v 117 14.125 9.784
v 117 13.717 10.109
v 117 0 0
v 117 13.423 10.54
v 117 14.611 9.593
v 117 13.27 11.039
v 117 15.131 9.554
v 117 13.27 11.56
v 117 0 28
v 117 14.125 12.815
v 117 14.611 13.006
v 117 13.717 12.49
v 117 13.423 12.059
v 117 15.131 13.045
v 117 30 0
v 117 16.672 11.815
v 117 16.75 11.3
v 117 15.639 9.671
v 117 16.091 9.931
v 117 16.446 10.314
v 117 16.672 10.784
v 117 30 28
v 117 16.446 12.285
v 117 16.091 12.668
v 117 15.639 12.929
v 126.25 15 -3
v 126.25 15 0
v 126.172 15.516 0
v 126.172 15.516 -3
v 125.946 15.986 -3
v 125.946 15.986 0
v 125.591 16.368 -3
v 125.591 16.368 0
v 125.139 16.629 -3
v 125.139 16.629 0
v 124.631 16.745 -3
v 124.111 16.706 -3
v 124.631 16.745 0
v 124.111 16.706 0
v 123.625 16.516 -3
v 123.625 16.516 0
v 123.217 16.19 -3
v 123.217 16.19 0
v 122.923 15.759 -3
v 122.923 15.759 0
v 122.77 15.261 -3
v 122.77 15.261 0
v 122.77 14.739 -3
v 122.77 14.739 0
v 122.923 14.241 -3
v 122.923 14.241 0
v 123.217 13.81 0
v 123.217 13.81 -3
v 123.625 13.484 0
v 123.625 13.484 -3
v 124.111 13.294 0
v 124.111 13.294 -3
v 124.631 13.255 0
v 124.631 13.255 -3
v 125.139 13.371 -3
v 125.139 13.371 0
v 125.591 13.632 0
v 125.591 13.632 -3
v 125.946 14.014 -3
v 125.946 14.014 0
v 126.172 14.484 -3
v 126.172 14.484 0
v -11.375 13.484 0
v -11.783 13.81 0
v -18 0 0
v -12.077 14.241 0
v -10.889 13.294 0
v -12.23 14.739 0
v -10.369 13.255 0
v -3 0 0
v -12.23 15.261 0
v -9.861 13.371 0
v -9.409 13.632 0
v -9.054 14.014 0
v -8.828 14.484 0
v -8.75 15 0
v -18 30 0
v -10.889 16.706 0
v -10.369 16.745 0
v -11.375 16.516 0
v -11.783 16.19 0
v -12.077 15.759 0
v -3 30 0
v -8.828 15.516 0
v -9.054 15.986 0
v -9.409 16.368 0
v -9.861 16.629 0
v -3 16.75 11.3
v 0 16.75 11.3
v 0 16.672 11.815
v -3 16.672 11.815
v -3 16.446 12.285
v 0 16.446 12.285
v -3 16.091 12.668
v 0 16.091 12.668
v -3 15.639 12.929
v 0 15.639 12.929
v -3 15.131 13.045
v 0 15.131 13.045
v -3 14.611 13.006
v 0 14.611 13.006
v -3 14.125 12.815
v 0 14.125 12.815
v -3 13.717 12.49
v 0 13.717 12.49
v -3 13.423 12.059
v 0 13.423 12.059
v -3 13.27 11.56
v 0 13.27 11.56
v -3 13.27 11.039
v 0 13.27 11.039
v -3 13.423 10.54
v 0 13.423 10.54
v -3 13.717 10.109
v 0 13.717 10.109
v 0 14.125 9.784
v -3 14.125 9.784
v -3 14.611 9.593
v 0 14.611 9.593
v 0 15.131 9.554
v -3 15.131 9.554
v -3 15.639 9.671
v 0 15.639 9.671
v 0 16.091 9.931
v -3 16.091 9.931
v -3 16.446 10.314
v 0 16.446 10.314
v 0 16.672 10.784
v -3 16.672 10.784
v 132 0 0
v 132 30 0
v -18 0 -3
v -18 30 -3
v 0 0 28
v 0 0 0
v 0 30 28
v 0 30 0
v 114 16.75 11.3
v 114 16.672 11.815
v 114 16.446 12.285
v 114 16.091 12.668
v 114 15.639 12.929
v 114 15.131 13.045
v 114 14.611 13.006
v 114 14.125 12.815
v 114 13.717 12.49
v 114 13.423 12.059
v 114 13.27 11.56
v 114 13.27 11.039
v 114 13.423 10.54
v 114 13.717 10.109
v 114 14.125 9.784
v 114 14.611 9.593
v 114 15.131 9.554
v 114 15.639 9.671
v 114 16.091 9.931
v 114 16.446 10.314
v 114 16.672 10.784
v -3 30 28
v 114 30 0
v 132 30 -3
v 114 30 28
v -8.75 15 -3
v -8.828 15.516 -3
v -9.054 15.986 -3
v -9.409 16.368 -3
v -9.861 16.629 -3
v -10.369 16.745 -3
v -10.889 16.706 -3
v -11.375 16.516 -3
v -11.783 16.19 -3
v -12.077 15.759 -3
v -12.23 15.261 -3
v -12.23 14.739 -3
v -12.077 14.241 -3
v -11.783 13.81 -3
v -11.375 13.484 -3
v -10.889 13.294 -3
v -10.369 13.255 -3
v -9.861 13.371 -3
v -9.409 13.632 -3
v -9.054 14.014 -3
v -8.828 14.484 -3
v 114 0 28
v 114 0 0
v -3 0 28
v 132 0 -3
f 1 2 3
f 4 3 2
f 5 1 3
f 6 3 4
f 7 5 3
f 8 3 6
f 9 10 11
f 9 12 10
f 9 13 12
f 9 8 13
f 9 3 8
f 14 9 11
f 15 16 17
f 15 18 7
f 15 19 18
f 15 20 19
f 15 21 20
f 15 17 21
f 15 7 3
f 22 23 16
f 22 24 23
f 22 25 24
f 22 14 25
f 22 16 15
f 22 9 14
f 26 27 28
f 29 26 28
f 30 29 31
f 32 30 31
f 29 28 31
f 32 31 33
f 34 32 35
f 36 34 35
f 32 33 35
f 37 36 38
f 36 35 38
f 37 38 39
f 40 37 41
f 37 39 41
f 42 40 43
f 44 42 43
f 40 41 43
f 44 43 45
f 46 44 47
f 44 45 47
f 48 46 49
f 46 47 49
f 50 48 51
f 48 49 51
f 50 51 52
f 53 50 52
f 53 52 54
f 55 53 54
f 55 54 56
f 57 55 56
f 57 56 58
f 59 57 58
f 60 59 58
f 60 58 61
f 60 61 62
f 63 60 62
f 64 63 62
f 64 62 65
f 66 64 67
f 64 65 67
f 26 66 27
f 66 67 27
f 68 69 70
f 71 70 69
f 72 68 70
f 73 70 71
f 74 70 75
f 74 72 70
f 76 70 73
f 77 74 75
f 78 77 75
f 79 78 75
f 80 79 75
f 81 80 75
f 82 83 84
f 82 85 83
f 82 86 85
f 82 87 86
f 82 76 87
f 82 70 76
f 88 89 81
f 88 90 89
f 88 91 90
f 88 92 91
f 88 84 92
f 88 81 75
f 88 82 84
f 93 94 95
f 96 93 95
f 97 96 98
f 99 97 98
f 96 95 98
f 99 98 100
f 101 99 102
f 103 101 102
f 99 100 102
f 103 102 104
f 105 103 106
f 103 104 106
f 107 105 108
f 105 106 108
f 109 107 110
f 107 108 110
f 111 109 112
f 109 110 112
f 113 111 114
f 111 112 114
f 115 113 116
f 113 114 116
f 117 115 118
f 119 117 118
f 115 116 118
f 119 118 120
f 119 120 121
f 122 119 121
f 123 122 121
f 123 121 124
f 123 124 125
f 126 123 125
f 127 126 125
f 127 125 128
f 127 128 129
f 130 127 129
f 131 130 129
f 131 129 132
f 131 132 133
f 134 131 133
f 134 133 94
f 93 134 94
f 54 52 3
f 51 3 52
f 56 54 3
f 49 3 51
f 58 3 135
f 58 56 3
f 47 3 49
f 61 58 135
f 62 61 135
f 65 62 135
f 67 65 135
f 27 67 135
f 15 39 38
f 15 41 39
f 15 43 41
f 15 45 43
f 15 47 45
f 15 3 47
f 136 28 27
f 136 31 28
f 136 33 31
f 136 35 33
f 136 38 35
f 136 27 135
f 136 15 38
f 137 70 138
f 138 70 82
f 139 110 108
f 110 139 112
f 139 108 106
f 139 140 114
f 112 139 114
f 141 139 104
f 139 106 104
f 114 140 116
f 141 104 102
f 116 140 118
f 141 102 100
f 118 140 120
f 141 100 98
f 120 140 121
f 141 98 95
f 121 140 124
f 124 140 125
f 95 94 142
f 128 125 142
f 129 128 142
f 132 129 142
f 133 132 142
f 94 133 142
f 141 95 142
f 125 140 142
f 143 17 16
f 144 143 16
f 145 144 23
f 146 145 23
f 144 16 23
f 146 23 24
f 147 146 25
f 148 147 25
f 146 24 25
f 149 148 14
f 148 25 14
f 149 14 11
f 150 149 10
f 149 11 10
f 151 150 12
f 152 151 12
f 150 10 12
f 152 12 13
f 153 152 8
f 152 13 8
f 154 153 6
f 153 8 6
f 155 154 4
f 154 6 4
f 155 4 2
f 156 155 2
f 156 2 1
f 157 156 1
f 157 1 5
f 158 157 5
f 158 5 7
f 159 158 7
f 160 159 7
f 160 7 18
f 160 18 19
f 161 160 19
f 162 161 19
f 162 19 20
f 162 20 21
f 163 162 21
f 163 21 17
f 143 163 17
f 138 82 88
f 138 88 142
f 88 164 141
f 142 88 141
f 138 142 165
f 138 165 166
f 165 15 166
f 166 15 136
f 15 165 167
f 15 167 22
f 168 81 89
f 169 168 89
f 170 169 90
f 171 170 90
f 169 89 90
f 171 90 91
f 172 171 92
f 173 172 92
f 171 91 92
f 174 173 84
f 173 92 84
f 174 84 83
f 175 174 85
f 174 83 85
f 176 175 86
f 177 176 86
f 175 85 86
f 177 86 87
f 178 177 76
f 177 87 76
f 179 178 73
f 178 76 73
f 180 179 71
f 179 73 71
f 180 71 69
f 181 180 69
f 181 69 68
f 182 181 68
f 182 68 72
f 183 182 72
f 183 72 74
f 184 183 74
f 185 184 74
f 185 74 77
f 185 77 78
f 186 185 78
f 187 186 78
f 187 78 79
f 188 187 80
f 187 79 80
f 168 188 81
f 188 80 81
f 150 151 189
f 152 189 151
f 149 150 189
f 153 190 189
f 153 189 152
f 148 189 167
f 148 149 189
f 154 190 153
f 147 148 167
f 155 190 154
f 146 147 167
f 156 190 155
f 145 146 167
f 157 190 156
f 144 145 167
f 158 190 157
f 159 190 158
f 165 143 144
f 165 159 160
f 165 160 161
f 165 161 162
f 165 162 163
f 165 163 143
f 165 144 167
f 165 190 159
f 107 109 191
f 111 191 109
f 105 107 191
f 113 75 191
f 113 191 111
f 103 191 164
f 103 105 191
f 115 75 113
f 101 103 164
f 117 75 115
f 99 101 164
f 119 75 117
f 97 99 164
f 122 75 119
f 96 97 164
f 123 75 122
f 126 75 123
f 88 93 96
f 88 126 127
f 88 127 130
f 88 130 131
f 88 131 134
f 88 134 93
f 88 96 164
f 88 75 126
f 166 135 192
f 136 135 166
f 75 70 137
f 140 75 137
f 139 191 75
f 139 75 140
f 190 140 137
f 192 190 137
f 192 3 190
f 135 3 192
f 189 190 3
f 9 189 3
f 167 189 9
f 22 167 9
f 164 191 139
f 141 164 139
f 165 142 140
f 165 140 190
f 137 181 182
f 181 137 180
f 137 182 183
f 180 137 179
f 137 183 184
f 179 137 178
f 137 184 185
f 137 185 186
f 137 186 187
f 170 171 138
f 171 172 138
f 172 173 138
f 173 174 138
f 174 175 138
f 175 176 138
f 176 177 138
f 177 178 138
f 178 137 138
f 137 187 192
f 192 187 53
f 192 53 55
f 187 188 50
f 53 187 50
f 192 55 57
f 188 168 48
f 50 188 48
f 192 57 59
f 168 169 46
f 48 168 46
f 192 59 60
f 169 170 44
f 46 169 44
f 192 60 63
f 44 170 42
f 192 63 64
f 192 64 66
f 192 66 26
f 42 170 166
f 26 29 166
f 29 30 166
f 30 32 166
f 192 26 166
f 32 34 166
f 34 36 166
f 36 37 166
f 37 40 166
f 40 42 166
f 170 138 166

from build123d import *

# Parameters (mm, degrees)
F0_W     = 3
F0_H     = 30
F0_W_2   = 114
F1_DEPTH = 3
F2_DEPTH = 28
F0_W_3   = 15
F0_R     = 1.75
F3_DEPTH = 3
F4_R     = 1.75
F5_DEPTH = 200


with BuildPart() as f1:
    # F0 (on Top) → F1 (new body)
    with BuildSketch(Plane.XY):
        with Locations((-1.5, 15)):
            Rectangle(F0_W, F0_H)
        with Locations((57, 15)):
            Rectangle(F0_W_2, F0_H)
        with Locations((115.5, 15)):
            Rectangle(F0_W, F0_H)
    extrude(amount=-F1_DEPTH)

    # F0 (on Top) → F2 (join)
    with BuildSketch(Plane.XY):
        with Locations((-1.5, 15)):
            Rectangle(F0_W, F0_H)
        with Locations((115.5, 15)):
            Rectangle(F0_W, F0_H)
    extrude(amount=F2_DEPTH)

    # F0 (on Top) → F3 (join)
    with BuildSketch(Plane.XY):
        with Locations((-10.5, 15)):
            Rectangle(F0_W_3, F0_H)
        with Locations((-10.5, 15)):
            Circle(F0_R, mode=Mode.SUBTRACT)
        with Locations((124.5, 15)):
            Rectangle(F0_W_3, F0_H)
        with Locations((124.5, 15)):
            Circle(F0_R, mode=Mode.SUBTRACT)
    extrude(amount=-F3_DEPTH)

    # F4 (on face) → F5 (cut)
    with BuildSketch(Plane.YZ.offset(117)):
        with Locations((15, 11.299537)):
            Circle(F4_R)
    extrude(amount=-F5_DEPTH, mode=Mode.SUBTRACT)


solid = f1.part
